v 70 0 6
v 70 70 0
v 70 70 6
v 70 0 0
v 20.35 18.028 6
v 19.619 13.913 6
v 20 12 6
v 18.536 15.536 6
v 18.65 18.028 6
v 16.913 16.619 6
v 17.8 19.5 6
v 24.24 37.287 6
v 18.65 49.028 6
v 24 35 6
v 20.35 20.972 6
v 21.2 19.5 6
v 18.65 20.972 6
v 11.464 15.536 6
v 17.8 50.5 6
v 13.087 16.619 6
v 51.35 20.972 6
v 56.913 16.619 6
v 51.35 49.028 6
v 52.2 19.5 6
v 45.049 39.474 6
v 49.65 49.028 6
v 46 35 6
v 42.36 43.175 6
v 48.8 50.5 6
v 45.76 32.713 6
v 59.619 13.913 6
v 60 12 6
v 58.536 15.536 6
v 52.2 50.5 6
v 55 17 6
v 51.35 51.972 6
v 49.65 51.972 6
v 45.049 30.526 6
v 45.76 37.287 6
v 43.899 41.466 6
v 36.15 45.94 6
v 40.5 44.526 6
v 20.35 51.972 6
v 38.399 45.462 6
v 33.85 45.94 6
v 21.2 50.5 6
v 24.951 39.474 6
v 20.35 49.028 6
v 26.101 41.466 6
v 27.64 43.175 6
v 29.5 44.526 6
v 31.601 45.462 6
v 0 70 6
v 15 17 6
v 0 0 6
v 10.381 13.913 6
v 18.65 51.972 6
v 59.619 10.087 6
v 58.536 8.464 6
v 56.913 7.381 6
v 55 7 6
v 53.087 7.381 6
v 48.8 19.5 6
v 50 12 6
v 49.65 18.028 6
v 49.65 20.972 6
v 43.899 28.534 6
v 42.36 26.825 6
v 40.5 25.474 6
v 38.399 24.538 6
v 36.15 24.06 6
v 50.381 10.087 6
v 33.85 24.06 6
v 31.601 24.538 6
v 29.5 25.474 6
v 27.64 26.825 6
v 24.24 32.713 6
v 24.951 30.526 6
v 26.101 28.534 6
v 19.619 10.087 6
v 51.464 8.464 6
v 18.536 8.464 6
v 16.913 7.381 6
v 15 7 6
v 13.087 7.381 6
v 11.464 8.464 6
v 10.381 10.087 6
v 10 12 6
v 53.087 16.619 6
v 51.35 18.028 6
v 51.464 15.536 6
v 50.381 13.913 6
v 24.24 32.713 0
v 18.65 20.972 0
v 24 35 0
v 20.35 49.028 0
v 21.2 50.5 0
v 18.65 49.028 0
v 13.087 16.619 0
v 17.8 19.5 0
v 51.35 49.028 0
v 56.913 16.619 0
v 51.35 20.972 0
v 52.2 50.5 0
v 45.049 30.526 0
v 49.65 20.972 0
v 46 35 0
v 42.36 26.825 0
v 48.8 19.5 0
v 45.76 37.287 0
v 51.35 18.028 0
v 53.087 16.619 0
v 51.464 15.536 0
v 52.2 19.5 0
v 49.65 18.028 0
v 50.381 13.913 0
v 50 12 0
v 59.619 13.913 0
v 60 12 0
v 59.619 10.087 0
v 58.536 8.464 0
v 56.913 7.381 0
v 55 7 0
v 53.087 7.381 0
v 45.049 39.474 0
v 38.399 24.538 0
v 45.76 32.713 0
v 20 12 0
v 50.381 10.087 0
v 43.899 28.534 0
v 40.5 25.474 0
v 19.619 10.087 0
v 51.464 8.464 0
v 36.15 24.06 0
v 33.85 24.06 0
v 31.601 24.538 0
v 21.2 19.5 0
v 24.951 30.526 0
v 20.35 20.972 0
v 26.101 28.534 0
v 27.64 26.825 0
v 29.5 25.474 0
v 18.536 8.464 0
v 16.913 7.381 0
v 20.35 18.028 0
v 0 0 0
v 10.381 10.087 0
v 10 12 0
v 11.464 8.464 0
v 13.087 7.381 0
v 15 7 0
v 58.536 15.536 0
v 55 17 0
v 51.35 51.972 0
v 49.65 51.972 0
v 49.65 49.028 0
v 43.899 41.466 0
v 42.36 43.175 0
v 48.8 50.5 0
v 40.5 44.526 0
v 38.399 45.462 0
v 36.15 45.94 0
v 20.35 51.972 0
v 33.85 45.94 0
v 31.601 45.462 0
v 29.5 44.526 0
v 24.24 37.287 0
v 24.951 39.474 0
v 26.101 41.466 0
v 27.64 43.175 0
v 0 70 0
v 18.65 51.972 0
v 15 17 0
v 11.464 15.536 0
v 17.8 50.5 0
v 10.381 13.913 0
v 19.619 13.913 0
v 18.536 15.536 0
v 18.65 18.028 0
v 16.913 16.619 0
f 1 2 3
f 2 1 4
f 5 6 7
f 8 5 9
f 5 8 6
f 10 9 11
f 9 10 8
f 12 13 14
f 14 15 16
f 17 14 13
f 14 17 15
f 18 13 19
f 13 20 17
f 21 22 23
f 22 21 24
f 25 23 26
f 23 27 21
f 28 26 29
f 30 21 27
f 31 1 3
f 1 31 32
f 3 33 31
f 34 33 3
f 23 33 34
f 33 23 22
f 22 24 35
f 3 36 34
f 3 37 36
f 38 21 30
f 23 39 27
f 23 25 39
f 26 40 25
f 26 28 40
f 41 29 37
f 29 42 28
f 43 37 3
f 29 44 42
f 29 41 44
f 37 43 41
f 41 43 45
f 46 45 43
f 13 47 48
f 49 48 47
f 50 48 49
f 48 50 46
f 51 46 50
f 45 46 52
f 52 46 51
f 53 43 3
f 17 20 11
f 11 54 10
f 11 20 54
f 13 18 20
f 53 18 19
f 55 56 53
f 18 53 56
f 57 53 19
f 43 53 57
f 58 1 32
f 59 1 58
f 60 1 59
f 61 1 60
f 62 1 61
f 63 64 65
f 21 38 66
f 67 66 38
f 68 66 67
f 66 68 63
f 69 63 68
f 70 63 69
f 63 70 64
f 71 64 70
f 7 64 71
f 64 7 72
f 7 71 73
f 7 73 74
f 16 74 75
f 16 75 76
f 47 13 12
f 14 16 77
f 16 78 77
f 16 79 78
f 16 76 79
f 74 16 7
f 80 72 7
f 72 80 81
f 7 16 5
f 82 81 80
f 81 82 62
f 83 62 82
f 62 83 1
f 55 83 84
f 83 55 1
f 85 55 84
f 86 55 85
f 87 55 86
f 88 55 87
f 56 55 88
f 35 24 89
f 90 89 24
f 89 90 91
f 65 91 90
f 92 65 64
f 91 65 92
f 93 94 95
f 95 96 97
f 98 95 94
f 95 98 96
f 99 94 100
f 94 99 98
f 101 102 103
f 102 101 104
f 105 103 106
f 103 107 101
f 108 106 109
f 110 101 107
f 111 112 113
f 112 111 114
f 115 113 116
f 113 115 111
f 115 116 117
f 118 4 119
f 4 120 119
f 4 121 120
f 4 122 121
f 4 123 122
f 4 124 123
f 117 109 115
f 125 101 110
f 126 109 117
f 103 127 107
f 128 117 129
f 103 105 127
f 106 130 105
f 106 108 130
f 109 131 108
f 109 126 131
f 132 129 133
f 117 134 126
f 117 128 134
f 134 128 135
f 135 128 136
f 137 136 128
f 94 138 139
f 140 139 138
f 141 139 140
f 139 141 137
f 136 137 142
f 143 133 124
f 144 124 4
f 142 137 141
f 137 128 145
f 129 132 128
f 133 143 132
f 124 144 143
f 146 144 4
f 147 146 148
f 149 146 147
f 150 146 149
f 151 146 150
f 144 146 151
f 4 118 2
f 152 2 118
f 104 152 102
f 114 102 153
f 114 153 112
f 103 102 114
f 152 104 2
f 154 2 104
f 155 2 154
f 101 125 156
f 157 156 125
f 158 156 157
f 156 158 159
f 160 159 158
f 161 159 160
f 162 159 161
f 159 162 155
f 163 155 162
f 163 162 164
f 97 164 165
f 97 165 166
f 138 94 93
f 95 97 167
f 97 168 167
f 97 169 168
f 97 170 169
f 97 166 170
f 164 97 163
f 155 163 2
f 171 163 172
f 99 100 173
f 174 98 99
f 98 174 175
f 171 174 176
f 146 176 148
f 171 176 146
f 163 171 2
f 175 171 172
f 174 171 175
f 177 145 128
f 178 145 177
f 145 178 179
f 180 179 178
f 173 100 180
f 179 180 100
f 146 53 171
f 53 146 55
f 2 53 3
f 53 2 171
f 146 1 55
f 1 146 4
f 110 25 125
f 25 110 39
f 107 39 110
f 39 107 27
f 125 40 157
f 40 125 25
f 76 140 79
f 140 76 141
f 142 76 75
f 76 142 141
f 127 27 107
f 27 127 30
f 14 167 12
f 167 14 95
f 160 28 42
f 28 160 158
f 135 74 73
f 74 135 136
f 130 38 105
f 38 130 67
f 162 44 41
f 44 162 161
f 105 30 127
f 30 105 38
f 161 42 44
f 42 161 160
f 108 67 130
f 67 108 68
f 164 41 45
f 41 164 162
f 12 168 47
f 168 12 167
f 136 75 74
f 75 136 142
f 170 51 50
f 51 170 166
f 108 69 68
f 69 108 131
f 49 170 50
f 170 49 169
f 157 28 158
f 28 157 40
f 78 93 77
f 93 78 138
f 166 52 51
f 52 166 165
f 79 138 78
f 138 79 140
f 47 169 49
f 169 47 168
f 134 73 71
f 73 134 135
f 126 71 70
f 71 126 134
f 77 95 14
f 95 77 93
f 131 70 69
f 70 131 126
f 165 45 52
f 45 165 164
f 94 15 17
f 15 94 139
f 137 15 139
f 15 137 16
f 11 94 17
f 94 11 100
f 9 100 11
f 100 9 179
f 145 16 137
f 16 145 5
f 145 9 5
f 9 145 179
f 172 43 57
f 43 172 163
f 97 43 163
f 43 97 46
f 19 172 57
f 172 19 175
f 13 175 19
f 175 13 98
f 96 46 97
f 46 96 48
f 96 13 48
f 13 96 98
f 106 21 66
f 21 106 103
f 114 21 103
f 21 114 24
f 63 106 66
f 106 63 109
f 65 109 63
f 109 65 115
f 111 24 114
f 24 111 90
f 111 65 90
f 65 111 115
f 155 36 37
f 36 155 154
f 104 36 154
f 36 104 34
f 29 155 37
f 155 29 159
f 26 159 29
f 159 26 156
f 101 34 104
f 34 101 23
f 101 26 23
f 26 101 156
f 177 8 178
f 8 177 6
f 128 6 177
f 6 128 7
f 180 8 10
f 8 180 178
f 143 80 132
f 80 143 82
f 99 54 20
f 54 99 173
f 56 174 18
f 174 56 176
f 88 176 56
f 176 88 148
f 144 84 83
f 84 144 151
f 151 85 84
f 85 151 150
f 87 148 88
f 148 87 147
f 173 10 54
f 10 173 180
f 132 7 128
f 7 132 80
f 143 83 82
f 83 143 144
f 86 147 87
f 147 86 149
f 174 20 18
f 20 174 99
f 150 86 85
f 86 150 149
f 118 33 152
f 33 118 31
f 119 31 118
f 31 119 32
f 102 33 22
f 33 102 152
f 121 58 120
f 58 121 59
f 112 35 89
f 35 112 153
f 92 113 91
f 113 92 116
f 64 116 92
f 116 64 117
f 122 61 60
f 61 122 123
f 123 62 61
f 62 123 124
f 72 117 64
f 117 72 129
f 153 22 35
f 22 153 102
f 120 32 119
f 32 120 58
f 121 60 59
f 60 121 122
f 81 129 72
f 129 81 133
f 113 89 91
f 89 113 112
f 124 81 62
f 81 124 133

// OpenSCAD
module motor_mount() {
  plate_w = 70.0;
  plate_h = 70.0;
  t = 6.0;
  hole_spacing = 31.0;
  bore_d = 22.0;
  mount_hole_d = 3.4;
  difference() {
    cube([plate_w, plate_h, t], center=false);
    translate([plate_w/2, plate_h/2, -1]) cylinder(h=t+2, d=bore_d, center=false);
    translate([plate_w/2 + -1*hole_spacing/2, plate_h/2 + -1*hole_spacing/2, -1]) cylinder(h=t+2, d=mount_hole_d, center=false);
    translate([plate_w/2 + -1*hole_spacing/2, plate_h/2 + 1*hole_spacing/2, -1]) cylinder(h=t+2, d=mount_hole_d, center=false);
    translate([plate_w/2 + 1*hole_spacing/2, plate_h/2 + -1*hole_spacing/2, -1]) cylinder(h=t+2, d=mount_hole_d, center=false);
    translate([plate_w/2 + 1*hole_spacing/2, plate_h/2 + 1*hole_spacing/2, -1]) cylinder(h=t+2, d=mount_hole_d, center=false);
    // rod clearances
    translate([plate_w/2 - 40.0/2, 12.0, -1]) cylinder(h=t+2, d=10.0, center=false);
    translate([plate_w/2 + 40.0/2, 12.0, -1]) cylinder(h=t+2, d=10.0, center=false);
  }
}
motor_mount();
